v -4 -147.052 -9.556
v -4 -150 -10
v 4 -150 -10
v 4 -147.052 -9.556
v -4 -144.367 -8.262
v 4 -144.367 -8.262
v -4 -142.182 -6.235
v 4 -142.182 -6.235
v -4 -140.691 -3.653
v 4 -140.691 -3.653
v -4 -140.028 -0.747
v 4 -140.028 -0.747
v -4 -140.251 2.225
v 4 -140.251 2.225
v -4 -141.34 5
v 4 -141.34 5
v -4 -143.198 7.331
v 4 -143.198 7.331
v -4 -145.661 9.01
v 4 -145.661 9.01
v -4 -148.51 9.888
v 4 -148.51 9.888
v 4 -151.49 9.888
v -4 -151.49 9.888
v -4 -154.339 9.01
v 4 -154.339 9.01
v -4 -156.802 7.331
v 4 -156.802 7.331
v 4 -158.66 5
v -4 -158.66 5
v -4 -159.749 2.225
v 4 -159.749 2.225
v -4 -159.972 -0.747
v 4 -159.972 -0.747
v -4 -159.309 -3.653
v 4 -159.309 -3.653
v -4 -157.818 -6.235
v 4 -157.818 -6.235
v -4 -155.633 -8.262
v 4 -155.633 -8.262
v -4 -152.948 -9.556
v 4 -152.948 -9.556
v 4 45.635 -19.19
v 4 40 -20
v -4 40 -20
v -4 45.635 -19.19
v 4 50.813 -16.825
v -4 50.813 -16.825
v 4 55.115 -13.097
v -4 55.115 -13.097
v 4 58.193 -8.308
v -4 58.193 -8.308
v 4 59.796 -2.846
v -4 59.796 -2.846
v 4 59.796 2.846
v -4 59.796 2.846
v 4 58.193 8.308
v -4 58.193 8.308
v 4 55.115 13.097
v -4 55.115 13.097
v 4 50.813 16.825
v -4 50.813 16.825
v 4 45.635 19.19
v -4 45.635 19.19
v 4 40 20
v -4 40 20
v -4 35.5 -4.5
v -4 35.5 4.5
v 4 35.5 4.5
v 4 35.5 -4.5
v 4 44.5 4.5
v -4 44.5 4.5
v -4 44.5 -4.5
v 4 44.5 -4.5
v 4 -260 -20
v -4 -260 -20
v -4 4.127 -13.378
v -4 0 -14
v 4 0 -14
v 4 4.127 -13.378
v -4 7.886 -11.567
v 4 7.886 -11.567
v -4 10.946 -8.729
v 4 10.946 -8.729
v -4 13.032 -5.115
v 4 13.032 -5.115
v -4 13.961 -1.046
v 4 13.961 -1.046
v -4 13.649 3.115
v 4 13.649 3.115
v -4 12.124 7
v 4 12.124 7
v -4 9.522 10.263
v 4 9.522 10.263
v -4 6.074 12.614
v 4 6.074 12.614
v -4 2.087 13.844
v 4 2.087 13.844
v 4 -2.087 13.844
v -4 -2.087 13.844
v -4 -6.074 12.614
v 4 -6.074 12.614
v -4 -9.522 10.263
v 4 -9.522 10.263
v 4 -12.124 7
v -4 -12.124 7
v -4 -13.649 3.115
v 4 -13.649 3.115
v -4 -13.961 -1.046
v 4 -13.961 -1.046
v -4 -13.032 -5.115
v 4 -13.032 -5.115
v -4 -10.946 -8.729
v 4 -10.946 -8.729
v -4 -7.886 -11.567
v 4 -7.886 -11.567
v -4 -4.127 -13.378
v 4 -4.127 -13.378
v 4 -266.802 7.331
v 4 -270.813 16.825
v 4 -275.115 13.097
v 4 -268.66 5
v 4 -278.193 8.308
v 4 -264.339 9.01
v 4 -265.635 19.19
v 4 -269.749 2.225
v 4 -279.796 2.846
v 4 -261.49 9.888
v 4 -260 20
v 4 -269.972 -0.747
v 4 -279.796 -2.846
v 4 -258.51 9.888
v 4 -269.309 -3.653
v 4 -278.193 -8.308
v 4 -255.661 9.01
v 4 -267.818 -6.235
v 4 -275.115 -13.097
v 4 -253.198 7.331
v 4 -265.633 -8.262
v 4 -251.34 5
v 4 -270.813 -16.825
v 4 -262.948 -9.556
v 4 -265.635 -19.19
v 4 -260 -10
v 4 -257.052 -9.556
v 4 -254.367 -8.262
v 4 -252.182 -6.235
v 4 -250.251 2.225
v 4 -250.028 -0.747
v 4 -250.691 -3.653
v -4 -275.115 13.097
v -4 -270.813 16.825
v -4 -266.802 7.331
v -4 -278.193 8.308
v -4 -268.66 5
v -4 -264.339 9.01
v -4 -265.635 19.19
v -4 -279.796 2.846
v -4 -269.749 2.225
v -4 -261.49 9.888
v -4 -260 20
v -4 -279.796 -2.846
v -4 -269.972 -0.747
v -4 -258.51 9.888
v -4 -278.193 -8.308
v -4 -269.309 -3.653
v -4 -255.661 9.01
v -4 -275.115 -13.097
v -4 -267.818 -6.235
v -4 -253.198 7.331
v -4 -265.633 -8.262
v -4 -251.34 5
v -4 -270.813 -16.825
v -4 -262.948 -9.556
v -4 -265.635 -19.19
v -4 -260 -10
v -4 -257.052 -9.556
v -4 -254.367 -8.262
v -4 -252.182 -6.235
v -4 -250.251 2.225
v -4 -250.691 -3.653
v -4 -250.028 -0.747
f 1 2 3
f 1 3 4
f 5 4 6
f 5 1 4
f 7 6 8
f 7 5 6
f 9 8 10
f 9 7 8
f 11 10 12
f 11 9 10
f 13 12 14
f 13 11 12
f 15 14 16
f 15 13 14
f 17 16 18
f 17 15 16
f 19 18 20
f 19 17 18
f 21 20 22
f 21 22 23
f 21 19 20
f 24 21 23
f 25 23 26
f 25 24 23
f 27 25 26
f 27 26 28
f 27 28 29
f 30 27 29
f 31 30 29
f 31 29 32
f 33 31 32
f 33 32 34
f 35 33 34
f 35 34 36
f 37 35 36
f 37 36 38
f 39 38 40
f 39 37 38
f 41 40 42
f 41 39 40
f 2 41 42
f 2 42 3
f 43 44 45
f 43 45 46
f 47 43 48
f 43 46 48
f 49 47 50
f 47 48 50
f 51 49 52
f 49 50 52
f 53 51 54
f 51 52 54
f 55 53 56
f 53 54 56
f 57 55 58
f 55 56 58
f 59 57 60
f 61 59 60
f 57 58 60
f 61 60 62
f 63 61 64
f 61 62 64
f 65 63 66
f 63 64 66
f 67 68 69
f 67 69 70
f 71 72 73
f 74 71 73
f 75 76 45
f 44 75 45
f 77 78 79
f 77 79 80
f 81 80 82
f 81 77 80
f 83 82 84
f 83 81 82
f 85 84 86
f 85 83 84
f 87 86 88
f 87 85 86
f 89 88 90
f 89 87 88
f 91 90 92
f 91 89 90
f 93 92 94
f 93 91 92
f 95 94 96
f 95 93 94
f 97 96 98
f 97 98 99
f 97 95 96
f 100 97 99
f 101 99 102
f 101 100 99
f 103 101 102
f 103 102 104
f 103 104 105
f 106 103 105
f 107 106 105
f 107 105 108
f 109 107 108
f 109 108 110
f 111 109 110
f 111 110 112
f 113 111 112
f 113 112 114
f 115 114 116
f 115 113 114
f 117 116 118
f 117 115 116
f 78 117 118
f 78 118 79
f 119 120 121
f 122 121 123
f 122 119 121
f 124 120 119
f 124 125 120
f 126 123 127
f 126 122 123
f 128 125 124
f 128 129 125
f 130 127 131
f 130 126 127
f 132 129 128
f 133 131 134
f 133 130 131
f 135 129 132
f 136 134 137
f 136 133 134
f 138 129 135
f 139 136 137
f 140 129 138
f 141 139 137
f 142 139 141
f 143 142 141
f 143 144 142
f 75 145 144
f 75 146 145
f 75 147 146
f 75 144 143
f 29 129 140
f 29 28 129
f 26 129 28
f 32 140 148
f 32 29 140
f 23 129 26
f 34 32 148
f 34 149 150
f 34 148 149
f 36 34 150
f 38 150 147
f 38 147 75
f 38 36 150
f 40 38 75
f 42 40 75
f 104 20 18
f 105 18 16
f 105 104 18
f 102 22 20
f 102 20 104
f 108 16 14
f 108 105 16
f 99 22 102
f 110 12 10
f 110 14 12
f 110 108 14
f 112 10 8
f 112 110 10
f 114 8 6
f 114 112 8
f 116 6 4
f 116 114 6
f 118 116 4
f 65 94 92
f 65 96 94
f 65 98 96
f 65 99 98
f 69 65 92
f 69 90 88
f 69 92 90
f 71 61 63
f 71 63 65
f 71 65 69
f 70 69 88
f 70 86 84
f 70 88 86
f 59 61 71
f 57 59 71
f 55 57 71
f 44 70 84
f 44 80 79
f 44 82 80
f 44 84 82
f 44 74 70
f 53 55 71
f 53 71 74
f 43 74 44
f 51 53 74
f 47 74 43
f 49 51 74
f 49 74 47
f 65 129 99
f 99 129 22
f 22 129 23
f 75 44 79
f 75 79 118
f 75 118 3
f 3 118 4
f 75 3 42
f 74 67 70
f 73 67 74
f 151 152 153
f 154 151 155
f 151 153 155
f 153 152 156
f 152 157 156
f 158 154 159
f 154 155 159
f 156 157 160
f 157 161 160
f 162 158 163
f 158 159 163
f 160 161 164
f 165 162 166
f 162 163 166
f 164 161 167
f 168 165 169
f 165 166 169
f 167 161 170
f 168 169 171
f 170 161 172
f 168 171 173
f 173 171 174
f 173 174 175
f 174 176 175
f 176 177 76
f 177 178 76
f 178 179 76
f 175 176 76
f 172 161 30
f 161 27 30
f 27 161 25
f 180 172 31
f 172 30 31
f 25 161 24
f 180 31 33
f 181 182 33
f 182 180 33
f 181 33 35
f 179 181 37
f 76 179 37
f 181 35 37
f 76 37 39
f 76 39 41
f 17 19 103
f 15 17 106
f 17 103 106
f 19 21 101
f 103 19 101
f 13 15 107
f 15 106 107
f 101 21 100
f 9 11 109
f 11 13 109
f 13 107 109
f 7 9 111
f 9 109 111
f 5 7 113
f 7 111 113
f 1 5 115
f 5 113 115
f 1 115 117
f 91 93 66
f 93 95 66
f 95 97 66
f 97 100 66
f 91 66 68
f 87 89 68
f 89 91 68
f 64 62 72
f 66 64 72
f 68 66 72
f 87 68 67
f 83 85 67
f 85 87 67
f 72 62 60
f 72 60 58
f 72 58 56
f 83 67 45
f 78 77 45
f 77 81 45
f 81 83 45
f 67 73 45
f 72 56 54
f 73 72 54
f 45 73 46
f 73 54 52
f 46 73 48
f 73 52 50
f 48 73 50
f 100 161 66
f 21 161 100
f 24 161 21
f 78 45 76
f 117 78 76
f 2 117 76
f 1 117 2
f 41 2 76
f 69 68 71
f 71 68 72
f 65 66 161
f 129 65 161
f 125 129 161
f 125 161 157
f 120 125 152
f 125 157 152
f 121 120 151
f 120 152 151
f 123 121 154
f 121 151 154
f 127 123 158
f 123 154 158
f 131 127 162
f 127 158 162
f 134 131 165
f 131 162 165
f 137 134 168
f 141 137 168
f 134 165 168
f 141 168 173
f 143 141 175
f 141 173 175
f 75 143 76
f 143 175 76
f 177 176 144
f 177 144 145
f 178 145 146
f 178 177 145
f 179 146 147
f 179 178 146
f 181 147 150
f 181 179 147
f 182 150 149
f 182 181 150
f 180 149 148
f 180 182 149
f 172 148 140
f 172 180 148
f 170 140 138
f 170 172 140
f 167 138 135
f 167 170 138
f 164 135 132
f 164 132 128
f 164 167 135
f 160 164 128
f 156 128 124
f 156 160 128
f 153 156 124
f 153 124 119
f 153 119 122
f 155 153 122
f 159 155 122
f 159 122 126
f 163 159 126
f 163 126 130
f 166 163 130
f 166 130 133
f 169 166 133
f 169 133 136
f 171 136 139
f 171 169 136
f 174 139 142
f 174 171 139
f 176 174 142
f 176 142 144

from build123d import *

# Parameters (mm, degrees)
BOSS_EXTRUDE1_DEPTH      = 4
BOSS_EXTRUDE1_DEPTH_BACK = 4
SKETCH2_R                = 14
SKETCH2_R_2              = 10
SKETCH2_W                = 9
SKETCH2_H                = 9


with BuildPart() as part:
    # Sketch2 → Boss-Extrude1 (new, two sides: drawn at the far end of the back side and taken through both)
    with BuildSketch(Plane(origin=(0, 0, 0), x_dir=(0, 0, -1), z_dir=(1, 0, 0)).offset(-BOSS_EXTRUDE1_DEPTH_BACK)):
        with BuildLine():
            Line((-20, 40), (-20, -260))
            ThreePointArc((-20, -260), (0, -280), (20, -260))
            Line((20, -260), (20, 40))
            ThreePointArc((20, 40), (0, 60), (-20, 40))
        make_face()
        Circle(SKETCH2_R, mode=Mode.SUBTRACT)
        with Locations((0, -150)):
            Circle(SKETCH2_R_2, mode=Mode.SUBTRACT)
        with Locations((0, -260)):
            Circle(SKETCH2_R_2, mode=Mode.SUBTRACT)
        with Locations((0, 40)):
            Rectangle(SKETCH2_W, SKETCH2_H, mode=Mode.SUBTRACT)
    extrude(amount=BOSS_EXTRUDE1_DEPTH + BOSS_EXTRUDE1_DEPTH_BACK)


solid = part.part
